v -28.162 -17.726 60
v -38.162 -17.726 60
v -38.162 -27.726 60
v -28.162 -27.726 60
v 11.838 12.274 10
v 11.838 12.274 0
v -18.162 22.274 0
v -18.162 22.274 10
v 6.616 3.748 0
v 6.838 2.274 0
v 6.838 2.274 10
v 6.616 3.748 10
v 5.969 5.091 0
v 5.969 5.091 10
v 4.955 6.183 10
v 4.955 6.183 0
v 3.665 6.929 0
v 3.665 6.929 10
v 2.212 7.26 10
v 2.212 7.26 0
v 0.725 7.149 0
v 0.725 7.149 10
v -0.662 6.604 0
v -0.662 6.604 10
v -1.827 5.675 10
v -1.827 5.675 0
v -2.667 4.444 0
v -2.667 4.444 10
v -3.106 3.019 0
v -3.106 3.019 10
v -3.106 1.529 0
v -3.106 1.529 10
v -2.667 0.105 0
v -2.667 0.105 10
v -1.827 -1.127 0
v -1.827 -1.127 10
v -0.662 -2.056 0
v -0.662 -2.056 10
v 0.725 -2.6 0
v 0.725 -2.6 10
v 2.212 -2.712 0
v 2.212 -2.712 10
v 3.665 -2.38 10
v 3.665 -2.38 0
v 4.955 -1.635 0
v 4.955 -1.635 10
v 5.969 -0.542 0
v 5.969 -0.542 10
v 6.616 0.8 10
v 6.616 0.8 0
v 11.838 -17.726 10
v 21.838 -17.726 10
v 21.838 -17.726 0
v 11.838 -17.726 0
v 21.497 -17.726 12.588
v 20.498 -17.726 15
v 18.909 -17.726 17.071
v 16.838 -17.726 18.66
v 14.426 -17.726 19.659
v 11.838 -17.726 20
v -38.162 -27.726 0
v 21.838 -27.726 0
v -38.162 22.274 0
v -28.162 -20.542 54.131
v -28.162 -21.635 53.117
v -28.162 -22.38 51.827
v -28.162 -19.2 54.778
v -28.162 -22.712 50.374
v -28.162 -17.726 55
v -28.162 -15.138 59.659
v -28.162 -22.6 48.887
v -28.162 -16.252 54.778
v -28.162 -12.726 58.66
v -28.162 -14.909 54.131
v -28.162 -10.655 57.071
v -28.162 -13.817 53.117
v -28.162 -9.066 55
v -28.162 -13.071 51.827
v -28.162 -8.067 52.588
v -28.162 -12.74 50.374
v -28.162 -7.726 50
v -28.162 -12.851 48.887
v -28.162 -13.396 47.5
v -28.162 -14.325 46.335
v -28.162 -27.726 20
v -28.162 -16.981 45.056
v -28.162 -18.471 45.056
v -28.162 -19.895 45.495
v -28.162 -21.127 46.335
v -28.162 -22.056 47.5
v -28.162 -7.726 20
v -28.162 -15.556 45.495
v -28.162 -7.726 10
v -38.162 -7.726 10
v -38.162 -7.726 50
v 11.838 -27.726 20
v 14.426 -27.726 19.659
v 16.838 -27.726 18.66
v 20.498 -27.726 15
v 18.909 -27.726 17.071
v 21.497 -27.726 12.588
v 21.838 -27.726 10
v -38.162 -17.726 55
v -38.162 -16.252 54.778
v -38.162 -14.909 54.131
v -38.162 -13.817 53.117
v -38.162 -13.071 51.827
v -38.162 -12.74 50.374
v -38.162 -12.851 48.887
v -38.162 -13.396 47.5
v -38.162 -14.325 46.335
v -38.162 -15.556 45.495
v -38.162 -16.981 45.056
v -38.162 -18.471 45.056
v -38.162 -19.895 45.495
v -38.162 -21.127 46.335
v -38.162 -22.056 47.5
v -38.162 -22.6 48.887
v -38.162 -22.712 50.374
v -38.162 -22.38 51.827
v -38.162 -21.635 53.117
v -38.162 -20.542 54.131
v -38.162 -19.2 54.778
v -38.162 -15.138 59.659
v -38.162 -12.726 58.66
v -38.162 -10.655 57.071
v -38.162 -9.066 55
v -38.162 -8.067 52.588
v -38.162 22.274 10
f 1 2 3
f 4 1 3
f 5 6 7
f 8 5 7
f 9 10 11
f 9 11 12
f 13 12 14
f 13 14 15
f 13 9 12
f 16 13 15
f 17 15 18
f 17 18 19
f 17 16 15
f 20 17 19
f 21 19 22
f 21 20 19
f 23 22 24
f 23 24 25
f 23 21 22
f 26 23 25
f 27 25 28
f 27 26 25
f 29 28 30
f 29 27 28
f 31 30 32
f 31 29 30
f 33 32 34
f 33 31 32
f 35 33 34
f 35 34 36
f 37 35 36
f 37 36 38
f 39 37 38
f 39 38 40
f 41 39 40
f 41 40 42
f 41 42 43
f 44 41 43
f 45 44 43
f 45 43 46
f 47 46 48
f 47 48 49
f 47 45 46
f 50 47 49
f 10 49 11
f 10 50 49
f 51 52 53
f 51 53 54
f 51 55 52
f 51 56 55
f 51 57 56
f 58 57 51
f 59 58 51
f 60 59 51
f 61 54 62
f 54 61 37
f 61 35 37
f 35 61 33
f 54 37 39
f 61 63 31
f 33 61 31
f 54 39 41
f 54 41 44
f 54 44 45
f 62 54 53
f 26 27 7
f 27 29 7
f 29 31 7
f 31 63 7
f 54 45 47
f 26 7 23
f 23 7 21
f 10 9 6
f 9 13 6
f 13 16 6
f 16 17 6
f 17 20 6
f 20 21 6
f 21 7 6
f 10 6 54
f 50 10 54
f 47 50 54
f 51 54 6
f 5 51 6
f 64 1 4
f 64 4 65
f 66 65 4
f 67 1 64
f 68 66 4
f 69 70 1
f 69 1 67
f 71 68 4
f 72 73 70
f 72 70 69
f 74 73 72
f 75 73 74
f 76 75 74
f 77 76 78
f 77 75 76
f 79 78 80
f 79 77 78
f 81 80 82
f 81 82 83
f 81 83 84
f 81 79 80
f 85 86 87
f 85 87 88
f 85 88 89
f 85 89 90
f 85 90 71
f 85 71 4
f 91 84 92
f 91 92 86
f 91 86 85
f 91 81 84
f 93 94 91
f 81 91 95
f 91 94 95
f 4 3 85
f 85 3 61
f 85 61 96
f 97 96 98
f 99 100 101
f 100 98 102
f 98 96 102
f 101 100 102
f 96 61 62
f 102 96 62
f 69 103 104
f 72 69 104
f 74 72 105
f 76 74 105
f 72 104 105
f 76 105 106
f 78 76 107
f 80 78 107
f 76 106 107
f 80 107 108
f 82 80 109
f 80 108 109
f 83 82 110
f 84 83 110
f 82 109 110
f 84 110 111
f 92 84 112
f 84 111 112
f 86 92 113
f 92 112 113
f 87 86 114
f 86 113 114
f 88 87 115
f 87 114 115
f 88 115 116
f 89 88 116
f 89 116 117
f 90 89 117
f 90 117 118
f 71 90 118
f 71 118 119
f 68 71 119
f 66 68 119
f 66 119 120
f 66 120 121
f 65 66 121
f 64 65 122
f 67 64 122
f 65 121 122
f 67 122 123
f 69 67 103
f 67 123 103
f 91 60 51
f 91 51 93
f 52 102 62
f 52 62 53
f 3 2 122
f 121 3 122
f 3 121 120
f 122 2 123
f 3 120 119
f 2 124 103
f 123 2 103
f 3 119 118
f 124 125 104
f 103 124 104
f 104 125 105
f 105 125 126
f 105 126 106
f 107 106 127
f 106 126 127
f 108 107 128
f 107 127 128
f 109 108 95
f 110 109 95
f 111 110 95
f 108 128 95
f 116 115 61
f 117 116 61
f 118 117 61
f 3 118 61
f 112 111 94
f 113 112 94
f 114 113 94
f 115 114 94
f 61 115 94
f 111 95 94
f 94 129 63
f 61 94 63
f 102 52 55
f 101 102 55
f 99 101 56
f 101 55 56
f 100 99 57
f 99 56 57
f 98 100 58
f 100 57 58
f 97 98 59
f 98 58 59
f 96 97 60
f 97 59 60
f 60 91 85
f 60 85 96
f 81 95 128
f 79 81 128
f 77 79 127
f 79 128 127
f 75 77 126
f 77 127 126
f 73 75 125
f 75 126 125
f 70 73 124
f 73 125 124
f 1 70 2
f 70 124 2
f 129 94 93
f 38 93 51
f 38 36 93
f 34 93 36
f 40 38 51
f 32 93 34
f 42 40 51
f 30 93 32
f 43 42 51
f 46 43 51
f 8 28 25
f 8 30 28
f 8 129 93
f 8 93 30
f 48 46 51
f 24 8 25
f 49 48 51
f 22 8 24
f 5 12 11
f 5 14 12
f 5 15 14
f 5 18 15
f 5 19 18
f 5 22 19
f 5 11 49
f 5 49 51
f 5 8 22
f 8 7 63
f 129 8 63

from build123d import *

# Parameters (mm, degrees)
SKETCH2_R           = 5
BOSS_EXTRUDE1_DEPTH = 10
SKETCH4_R           = 5
BOSS_EXTRUDE2_DEPTH = 10
BOSS_EXTRUDE3_DEPTH = 10
SKETCH6_OUTSIDE_W   = 81.698
SKETCH6_OUTSIDE_H   = 81.698
CUT_EXTRUDE1_DEPTH  = 20


with BuildPart() as part:
    # Sketch2 → Boss-Extrude1 (new body)
    with BuildSketch(Plane.XY):
        Polygon((-38.161993769, 22.274143302), (-38.161993769, -27.725856698), (11.838006231, -27.725856698), (11.838006231, 12.274143302), (-18.161993769, 22.274143302), align=None)
        with Locations((1.838006231, 2.274143302)):
            Circle(SKETCH2_R, mode=Mode.SUBTRACT)
    extrude(amount=BOSS_EXTRUDE1_DEPTH)

    # Sketch4 → Boss-Extrude2 (add)
    with BuildSketch(Plane.ZY.offset(38.161993769)):
        with BuildLine():
            Line((10, -7.725856698), (50, -7.725856698))
            ThreePointArc((50, -7.725856698), (57.071067812, -10.654788886), (60, -17.725856698))
            Line((60, -17.725856698), (60, -27.725856698))
            Line((60, -27.725856698), (10, -27.725856698))
            Line((10, -27.725856698), (10, -7.725856698))
        make_face()
        with Locations((50, -17.725856698)):
            Circle(SKETCH4_R, mode=Mode.SUBTRACT)
    extrude(amount=-BOSS_EXTRUDE2_DEPTH)

    # Sketch5 → Boss-Extrude3 (add, symmetric)
    with BuildSketch(Plane.XY.offset(10)):
        Polygon((-28.161993769, -7.725856698), (-28.161993769, -27.725856698), (21.838006231, -27.725856698), (21.838006231, -17.725856698), (11.838006231, -17.725856698), align=None)
    extrude(amount=BOSS_EXTRUDE3_DEPTH, both=True)

    # Sketch6 outside → Cut-Extrude1 (cut)
    with BuildSketch(Plane(origin=(0, -17.725856698, 0), x_dir=(1, 0, 0), z_dir=(0, 1, 0))):
        with Locations((-8.162, -30)):
            Rectangle(SKETCH6_OUTSIDE_W, SKETCH6_OUTSIDE_H)
        with BuildLine():
            Line((21.838006231, 0), (21.838006231, -10))
            ThreePointArc((21.838006231, -10), (18.909074042, -17.071067812), (11.838006231, -20))
            Line((11.838006231, -20), (4.462340435, -20))
            Line((4.462340435, -20), (4.462340435, -63.08469243))
            Line((4.462340435, -63.08469243), (-49.719837023, -63.08469243))
            Line((-49.719837023, -63.08469243), (-49.719837023, 0))
            Line((-49.719837023, 0), (21.838006231, 0))
        make_face(mode=Mode.SUBTRACT)
    extrude(amount=-CUT_EXTRUDE1_DEPTH, mode=Mode.SUBTRACT)


solid = part.part
